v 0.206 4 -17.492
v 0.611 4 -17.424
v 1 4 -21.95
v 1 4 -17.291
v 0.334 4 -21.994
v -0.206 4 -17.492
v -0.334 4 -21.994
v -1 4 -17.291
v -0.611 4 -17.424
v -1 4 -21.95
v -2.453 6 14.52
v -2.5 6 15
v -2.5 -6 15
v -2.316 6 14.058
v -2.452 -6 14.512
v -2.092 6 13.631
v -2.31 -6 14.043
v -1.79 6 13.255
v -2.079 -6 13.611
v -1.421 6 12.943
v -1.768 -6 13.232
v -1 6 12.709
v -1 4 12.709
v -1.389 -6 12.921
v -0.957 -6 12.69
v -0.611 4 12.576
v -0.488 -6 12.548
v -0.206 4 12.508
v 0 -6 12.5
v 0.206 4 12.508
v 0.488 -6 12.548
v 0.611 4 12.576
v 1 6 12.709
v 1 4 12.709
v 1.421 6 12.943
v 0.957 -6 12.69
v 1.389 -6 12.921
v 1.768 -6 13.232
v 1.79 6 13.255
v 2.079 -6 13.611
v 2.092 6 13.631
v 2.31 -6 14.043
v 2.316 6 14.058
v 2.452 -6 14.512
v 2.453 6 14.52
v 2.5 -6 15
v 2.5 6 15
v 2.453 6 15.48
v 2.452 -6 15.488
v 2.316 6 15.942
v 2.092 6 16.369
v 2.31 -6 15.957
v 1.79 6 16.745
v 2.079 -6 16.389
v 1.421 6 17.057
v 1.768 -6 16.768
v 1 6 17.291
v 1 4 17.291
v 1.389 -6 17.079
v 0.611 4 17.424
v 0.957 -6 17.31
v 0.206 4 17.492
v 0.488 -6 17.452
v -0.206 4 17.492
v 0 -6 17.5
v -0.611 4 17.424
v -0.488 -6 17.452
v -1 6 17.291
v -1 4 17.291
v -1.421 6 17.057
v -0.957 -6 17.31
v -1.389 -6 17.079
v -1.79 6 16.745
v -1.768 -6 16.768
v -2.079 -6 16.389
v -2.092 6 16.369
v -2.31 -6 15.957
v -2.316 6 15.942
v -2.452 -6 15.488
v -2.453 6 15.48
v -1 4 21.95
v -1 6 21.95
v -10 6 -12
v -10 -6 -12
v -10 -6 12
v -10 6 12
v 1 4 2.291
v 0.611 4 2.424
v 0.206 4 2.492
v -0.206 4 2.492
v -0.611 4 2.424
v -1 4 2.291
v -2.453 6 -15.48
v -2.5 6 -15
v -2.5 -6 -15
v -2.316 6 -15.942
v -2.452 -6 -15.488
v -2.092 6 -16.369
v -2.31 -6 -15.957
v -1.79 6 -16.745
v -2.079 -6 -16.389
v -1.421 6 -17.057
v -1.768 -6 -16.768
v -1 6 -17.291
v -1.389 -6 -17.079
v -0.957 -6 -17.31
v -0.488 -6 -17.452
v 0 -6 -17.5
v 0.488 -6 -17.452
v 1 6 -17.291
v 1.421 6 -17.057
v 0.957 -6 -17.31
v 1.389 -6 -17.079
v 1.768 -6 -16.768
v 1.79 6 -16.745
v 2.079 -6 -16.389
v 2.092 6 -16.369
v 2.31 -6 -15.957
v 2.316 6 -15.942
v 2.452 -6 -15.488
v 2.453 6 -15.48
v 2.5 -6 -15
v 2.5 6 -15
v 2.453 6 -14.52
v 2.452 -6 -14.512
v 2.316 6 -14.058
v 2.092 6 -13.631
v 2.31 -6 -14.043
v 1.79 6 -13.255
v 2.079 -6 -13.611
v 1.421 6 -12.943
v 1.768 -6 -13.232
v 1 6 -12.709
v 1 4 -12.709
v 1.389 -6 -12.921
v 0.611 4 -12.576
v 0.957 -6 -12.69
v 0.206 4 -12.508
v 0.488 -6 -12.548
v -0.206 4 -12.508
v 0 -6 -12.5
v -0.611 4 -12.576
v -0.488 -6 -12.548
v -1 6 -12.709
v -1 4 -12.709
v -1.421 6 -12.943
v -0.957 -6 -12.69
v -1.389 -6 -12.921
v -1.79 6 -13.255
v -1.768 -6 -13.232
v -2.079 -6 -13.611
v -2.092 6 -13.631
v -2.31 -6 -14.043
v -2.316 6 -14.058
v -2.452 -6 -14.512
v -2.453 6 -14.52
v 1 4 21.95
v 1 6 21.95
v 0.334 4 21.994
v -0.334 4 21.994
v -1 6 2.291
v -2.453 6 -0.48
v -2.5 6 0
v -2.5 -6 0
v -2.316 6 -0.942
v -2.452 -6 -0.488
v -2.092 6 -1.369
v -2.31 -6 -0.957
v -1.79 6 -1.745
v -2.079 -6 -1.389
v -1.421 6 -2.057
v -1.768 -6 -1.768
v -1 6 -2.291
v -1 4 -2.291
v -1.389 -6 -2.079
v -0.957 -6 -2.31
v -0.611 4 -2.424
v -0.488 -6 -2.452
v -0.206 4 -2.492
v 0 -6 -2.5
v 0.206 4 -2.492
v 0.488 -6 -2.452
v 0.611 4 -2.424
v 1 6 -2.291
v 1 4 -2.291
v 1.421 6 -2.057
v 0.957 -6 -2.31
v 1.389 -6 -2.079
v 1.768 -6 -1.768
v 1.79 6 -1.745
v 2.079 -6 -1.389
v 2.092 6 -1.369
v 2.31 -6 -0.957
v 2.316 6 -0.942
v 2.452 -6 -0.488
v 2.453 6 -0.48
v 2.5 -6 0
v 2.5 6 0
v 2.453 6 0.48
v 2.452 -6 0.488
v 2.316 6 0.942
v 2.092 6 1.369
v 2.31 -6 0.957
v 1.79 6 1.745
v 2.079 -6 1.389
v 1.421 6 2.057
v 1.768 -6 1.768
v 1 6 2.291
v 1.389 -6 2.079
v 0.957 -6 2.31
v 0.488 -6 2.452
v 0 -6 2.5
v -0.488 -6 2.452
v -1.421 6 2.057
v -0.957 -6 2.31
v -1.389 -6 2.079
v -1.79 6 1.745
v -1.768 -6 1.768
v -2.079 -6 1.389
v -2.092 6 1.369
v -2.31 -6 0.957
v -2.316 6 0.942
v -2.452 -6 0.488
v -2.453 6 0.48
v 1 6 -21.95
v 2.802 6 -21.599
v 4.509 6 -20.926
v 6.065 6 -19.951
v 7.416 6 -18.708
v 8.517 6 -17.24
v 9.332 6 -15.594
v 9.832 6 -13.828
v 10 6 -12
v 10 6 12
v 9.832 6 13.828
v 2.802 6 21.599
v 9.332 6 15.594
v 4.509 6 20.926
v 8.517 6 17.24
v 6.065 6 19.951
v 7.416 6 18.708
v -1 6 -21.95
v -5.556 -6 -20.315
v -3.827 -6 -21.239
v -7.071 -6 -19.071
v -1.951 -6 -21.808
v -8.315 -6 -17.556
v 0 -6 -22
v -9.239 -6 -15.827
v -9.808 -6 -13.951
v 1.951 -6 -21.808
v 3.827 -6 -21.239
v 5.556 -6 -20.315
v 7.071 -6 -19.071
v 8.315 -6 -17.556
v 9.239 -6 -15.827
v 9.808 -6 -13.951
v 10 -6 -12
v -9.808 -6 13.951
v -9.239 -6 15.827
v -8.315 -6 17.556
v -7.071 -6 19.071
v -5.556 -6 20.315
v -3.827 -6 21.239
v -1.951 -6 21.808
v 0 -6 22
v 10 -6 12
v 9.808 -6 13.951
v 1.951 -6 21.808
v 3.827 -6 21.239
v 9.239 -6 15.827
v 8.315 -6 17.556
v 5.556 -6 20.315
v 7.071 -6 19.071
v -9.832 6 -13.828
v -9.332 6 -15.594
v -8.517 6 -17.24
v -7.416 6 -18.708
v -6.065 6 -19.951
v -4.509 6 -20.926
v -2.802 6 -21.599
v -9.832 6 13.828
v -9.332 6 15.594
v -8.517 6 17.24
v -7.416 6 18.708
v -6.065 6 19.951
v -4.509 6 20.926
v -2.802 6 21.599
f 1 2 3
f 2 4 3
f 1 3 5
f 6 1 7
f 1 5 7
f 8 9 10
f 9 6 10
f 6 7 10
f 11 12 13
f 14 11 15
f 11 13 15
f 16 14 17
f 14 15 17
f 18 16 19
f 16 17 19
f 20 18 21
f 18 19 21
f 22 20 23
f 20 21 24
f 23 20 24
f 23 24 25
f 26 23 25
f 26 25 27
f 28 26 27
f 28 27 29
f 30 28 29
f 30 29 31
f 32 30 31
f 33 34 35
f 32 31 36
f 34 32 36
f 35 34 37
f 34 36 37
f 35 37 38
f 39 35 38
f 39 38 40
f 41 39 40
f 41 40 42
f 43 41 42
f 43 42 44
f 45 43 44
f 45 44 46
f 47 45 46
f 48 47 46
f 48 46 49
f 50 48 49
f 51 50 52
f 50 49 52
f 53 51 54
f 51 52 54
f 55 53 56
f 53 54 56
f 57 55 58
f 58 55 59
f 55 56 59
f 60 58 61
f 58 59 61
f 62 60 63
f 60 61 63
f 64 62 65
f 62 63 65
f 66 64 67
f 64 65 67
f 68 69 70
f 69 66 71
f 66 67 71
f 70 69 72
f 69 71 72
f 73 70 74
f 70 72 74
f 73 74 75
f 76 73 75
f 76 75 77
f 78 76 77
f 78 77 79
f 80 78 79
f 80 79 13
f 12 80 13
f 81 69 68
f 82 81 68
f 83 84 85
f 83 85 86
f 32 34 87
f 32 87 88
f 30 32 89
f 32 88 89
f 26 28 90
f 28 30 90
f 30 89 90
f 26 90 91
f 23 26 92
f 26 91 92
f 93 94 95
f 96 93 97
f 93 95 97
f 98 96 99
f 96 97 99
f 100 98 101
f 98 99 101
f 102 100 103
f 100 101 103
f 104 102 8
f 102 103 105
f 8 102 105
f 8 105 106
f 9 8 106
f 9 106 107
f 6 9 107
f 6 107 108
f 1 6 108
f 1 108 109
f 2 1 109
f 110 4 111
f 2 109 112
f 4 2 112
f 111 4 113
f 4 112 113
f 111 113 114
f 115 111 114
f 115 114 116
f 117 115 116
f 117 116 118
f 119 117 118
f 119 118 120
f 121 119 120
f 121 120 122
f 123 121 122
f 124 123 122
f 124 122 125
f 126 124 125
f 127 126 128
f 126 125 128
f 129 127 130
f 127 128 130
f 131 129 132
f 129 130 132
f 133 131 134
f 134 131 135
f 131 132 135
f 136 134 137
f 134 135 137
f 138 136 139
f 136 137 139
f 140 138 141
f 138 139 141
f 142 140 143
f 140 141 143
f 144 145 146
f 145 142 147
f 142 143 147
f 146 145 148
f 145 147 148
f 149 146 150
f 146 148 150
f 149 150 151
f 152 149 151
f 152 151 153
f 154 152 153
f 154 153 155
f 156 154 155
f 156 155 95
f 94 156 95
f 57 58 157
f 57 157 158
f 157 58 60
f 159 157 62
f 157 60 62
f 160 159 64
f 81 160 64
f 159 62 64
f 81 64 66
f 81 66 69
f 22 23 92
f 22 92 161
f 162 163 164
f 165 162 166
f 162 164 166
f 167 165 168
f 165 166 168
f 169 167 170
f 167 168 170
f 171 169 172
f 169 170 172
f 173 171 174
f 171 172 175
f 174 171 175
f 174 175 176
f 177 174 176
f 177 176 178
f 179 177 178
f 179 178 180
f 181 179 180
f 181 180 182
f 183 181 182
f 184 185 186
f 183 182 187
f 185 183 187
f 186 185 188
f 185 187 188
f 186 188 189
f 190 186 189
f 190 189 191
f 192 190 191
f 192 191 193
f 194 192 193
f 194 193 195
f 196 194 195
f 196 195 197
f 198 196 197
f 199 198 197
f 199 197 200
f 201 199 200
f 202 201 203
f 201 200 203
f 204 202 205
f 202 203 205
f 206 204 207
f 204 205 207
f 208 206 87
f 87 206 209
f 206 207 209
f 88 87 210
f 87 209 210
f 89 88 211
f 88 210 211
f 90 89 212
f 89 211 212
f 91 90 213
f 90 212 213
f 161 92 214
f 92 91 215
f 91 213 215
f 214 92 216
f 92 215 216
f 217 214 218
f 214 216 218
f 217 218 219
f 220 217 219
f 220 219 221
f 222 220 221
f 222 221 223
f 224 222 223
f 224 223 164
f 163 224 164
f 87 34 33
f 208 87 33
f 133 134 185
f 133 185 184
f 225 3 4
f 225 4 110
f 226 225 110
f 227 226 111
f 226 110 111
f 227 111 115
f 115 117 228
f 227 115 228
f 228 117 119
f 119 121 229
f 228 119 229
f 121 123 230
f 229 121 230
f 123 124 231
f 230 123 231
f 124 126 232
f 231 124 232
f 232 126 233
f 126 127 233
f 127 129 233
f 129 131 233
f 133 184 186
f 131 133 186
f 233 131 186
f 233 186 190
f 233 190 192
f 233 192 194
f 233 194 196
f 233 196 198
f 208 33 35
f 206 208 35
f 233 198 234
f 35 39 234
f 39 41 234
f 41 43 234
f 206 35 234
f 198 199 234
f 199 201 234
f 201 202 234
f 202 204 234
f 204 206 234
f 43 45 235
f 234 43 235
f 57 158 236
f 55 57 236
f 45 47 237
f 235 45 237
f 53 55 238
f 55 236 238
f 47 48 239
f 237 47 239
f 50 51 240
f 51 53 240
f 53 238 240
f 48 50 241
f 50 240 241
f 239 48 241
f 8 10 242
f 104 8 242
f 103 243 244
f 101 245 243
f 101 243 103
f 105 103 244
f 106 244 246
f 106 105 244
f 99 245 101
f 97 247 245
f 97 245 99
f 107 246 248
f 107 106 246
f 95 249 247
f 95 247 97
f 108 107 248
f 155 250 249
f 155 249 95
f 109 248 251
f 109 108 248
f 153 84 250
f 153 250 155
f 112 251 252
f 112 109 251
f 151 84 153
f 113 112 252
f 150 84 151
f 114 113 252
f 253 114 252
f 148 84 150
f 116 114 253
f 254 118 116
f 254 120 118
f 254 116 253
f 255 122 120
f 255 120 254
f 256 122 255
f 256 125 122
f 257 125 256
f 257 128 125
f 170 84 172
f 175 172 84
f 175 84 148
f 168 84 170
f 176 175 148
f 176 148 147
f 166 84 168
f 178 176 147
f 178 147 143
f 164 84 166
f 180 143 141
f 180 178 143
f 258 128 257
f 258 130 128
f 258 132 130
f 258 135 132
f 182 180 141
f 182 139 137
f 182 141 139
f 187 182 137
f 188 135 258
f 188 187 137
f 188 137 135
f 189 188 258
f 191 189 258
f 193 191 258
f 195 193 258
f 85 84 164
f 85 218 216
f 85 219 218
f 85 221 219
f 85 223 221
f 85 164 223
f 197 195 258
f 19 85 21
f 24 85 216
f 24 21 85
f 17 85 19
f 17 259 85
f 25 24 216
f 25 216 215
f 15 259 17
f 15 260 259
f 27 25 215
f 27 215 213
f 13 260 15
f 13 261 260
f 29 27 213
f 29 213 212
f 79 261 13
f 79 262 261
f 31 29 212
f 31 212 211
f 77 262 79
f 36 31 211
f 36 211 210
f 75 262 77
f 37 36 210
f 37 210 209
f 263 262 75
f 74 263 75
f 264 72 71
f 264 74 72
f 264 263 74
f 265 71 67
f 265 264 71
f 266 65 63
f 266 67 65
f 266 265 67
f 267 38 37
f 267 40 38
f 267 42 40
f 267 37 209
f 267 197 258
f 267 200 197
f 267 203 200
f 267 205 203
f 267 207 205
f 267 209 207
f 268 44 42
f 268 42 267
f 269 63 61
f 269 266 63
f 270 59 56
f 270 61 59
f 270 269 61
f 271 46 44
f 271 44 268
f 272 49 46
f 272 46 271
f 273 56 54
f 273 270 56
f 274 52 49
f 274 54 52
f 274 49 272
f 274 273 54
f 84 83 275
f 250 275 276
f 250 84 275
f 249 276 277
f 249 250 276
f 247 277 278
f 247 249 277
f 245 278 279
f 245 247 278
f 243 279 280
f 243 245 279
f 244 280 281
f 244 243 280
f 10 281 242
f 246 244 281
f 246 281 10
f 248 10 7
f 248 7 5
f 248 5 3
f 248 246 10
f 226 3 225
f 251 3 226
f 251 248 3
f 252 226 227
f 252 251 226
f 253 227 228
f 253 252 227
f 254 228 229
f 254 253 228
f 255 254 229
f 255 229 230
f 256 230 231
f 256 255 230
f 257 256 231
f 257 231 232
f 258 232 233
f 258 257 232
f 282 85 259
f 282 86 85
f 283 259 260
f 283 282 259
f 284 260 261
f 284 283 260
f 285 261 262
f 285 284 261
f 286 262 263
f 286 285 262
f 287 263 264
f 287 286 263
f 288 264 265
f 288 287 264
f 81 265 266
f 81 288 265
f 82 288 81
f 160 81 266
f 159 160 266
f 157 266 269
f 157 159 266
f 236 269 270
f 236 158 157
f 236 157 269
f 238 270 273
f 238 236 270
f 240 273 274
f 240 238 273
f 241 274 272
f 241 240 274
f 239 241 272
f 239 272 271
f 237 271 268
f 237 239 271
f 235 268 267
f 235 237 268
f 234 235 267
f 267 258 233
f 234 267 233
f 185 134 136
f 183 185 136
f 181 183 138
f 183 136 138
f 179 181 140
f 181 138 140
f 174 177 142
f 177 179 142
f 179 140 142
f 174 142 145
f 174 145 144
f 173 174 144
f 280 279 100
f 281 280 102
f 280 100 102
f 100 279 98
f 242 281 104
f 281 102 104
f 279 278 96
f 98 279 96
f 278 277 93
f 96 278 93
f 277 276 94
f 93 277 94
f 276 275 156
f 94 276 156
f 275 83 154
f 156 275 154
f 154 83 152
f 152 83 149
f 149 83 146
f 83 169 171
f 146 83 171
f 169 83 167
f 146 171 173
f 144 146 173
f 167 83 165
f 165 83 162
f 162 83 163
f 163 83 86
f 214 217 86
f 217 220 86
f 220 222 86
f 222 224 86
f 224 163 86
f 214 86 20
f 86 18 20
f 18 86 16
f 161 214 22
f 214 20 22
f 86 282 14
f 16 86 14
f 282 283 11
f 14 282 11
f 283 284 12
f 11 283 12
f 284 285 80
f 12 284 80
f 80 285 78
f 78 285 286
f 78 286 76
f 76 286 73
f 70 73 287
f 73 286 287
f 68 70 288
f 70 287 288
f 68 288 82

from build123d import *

# Parameters (mm, degrees)
SKETCH1_W             = 20
SKETCH1_H             = 12
BOSS_EXTRUDE1_DEPTH   = 22
M6X1_0_TAPPED_HOLE1_D = 5
SKETCH7_W             = 2
SKETCH7_H             = 2
CUT_EXTRUDE2_DEPTH    = 46.519226707
FILLET1_RADIUS        = 10
FILLET1_LENGTH        = 12
FILLET2_RADIUS        = 10
FILLET2_LENGTH        = 12


with BuildPart() as part:
    # Sketch1 → Boss-Extrude1 (new, symmetric)
    with BuildSketch(Plane.XY):
        Rectangle(SKETCH1_W, SKETCH1_H)
    extrude(amount=BOSS_EXTRUDE1_DEPTH, both=True)

    # M6x1.0 Tapped Hole1 (through all)
    with Locations(Plane(origin=(0, 6, 0), x_dir=(1, 0, 0), z_dir=(0, 1, 0))):
        with Locations((0, -15), (0, 0), (0, 15)):
            Hole(M6X1_0_TAPPED_HOLE1_D / 2)

    # Sketch7 → Cut-Extrude2 (cut, through all)
    with BuildSketch(Plane(origin=(0, 0, -22), x_dir=(-1, 0, 0), z_dir=(0, 0, -1))):
        with Locations((0, 5)):
            Rectangle(SKETCH7_W, SKETCH7_H)
    extrude(amount=-CUT_EXTRUDE2_DEPTH, mode=Mode.SUBTRACT)

    # Fillet1: full round fillet: the end face becomes a half cylinder, R = half its width
    fillet1_face = Plane((0, 0, -22), x_dir=(0, -1, 0), z_dir=(0, 0, -1))  # on the end face: x along it, z out of the body
    fillet1_slab = fillet1_face.offset(-FILLET1_RADIUS / 2) * Box(FILLET1_LENGTH, 2 * FILLET1_RADIUS, FILLET1_RADIUS, mode=Mode.PRIVATE)  # the body's end, R deep
    fillet1_round = Plane((0, 0, -12), x_dir=(0, 0, -1), z_dir=(0, -1, 0)) * Cylinder(FILLET1_RADIUS, FILLET1_LENGTH, mode=Mode.PRIVATE)  # its axis R under the face
    add(fillet1_slab - fillet1_round, mode=Mode.SUBTRACT)

    # Fillet2: full round fillet: the end face becomes a half cylinder, R = half its width
    fillet2_face = Plane((0, 0, 22), x_dir=(0, 1, 0), z_dir=(0, 0, 1))  # on the end face: x along it, z out of the body
    fillet2_slab = fillet2_face.offset(-FILLET2_RADIUS / 2) * Box(FILLET2_LENGTH, 2 * FILLET2_RADIUS, FILLET2_RADIUS, mode=Mode.PRIVATE)  # the body's end, R deep
    fillet2_round = Plane((0, 0, 12), x_dir=(0, 0, 1), z_dir=(0, 1, 0)) * Cylinder(FILLET2_RADIUS, FILLET2_LENGTH, mode=Mode.PRIVATE)  # its axis R under the face
    add(fillet2_slab - fillet2_round, mode=Mode.SUBTRACT)


solid = part.part
